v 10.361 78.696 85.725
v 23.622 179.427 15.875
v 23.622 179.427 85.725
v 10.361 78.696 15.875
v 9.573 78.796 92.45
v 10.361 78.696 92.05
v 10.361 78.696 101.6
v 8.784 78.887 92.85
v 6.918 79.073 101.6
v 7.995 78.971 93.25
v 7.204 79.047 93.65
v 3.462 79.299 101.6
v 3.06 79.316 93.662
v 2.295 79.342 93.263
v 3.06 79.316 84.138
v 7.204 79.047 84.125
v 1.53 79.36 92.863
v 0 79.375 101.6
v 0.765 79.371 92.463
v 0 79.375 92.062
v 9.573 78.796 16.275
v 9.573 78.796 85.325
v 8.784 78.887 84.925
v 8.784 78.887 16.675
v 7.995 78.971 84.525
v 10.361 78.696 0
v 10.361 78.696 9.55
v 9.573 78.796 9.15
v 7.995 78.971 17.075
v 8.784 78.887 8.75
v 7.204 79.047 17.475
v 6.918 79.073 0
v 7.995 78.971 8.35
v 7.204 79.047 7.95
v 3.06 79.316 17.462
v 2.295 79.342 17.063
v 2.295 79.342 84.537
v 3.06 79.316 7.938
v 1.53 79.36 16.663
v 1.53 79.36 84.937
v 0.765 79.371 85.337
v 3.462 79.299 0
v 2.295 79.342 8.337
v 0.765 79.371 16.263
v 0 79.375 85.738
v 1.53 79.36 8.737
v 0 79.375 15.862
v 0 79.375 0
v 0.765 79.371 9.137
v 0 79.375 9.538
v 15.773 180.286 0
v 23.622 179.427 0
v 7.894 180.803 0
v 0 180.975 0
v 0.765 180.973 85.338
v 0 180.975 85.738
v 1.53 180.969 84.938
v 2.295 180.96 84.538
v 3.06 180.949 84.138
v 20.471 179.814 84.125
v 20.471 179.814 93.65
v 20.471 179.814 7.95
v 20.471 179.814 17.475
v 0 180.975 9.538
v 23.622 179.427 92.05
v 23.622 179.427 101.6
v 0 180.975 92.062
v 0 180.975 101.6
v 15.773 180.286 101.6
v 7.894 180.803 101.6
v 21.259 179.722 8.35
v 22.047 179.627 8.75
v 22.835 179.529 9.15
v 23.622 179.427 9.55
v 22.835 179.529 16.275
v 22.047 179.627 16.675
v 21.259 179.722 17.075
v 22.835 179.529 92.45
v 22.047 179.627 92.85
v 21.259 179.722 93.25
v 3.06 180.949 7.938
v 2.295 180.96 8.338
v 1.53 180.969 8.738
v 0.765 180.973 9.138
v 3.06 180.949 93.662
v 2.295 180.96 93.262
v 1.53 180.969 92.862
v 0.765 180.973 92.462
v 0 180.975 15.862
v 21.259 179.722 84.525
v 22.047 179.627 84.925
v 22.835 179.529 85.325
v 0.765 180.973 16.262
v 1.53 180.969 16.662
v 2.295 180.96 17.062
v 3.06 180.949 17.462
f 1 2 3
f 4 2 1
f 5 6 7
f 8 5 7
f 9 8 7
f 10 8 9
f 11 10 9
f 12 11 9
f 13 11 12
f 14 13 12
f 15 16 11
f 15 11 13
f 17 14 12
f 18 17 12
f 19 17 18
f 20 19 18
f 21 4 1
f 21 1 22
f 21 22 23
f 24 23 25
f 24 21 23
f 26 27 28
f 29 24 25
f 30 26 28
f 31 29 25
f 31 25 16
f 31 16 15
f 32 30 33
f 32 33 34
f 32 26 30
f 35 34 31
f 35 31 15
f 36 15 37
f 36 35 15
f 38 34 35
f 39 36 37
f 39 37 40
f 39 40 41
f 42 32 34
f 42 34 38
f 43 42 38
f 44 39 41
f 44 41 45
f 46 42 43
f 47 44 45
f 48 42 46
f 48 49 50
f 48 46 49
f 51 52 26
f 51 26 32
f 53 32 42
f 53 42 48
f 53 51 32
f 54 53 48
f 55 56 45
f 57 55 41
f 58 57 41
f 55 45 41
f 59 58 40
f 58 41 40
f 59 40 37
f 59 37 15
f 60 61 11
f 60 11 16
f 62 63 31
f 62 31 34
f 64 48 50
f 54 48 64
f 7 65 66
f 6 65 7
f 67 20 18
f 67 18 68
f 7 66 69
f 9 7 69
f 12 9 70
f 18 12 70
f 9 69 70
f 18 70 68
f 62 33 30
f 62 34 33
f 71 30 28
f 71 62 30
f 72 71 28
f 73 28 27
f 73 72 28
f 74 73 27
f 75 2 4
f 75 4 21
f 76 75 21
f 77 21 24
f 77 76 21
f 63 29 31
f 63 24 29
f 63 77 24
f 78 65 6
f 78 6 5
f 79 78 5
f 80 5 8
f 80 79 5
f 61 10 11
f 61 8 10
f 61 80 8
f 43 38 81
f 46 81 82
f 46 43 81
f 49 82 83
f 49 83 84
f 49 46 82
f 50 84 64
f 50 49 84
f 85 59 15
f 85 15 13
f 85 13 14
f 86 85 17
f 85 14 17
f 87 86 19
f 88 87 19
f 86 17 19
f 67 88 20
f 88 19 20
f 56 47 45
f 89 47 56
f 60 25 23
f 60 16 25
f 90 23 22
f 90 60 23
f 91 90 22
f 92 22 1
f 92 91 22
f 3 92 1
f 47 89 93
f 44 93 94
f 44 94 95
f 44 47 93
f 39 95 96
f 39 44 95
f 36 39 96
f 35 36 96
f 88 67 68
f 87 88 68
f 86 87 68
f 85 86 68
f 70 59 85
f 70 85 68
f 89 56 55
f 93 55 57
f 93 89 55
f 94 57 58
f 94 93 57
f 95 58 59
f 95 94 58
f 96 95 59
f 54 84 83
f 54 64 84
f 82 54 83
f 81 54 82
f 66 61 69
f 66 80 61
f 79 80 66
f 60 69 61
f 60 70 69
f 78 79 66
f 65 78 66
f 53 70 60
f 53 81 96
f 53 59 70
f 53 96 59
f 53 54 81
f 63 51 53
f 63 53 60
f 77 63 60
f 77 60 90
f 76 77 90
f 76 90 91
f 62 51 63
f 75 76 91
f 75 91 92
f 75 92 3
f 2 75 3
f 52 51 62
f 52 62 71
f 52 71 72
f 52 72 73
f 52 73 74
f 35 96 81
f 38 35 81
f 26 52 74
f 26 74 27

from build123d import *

# Parameters (mm, degrees)
BOSS_EXTRUDE1_DEPTH     = 101.6
CUT_EXTRUDE1_DEPTH      = 2.352318769
CUT_EXTRUDE1_DEPTH_BACK = 104.135020581
CUT_EXTRUDE2_DEPTH      = 1.679064128
CUT_EXTRUDE2_DEPTH_BACK = 102.6


with BuildPart() as part:
    # Sketch1 → Boss-Extrude1 (new body)
    with BuildSketch(Plane.XY):
        with BuildLine():
            Line((0, 79.375), (0, 180.975))
            ThreePointArc((0, 180.975), (11.836331312, 180.587518633), (23.621977637, 179.426733787))
            Line((23.621977637, 179.426733787), (10.360516507, 78.695935872))
            ThreePointArc((10.360516507, 78.695935872), (5.191373383, 79.205052032), (0, 79.375))
        make_face()
    extrude(amount=BOSS_EXTRUDE1_DEPTH)

    # Sketch5 → Cut-Extrude1 (cut, two sides)
    with BuildSketch(Plane(origin=(10.360516507, 78.695935872, 0), x_dir=(0, 0, -1), z_dir=(-0.130526192, -0.991444861, 0))) as cut_extrude1_sk:
        Polygon((-93.64987891, -3.175), (-84.12487891, -3.175), (-85.725, 0), (-92.04975782, 0), align=None)
        Polygon((-15.875, 0), (-17.47512109, -3.175), (-7.95012109, -3.175), (-9.55024218, 0), align=None)
    extrude(amount=CUT_EXTRUDE1_DEPTH, mode=Mode.SUBTRACT)
    extrude(cut_extrude1_sk.sketch, amount=-CUT_EXTRUDE1_DEPTH_BACK, mode=Mode.SUBTRACT)

    # Sketch6 → Cut-Extrude2 (cut, two sides)
    with BuildSketch(Plane(origin=(0, 79.375, 0), x_dir=(0, 0, -1), z_dir=(0, -1, 0))) as cut_extrude2_sk:
        Polygon((-84.1375, 3.059915209), (-93.6625, 3.059915209), (-92.06237891, 0), (-85.73762109, 0), align=None)
        Polygon((-15.86237891, 0), (-17.4625, 3.059915209), (-7.9375, 3.059915209), (-9.53762109, 0), align=None)
    extrude(amount=CUT_EXTRUDE2_DEPTH, mode=Mode.SUBTRACT)
    extrude(cut_extrude2_sk.sketch, amount=-CUT_EXTRUDE2_DEPTH_BACK, mode=Mode.SUBTRACT)


solid = part.part
